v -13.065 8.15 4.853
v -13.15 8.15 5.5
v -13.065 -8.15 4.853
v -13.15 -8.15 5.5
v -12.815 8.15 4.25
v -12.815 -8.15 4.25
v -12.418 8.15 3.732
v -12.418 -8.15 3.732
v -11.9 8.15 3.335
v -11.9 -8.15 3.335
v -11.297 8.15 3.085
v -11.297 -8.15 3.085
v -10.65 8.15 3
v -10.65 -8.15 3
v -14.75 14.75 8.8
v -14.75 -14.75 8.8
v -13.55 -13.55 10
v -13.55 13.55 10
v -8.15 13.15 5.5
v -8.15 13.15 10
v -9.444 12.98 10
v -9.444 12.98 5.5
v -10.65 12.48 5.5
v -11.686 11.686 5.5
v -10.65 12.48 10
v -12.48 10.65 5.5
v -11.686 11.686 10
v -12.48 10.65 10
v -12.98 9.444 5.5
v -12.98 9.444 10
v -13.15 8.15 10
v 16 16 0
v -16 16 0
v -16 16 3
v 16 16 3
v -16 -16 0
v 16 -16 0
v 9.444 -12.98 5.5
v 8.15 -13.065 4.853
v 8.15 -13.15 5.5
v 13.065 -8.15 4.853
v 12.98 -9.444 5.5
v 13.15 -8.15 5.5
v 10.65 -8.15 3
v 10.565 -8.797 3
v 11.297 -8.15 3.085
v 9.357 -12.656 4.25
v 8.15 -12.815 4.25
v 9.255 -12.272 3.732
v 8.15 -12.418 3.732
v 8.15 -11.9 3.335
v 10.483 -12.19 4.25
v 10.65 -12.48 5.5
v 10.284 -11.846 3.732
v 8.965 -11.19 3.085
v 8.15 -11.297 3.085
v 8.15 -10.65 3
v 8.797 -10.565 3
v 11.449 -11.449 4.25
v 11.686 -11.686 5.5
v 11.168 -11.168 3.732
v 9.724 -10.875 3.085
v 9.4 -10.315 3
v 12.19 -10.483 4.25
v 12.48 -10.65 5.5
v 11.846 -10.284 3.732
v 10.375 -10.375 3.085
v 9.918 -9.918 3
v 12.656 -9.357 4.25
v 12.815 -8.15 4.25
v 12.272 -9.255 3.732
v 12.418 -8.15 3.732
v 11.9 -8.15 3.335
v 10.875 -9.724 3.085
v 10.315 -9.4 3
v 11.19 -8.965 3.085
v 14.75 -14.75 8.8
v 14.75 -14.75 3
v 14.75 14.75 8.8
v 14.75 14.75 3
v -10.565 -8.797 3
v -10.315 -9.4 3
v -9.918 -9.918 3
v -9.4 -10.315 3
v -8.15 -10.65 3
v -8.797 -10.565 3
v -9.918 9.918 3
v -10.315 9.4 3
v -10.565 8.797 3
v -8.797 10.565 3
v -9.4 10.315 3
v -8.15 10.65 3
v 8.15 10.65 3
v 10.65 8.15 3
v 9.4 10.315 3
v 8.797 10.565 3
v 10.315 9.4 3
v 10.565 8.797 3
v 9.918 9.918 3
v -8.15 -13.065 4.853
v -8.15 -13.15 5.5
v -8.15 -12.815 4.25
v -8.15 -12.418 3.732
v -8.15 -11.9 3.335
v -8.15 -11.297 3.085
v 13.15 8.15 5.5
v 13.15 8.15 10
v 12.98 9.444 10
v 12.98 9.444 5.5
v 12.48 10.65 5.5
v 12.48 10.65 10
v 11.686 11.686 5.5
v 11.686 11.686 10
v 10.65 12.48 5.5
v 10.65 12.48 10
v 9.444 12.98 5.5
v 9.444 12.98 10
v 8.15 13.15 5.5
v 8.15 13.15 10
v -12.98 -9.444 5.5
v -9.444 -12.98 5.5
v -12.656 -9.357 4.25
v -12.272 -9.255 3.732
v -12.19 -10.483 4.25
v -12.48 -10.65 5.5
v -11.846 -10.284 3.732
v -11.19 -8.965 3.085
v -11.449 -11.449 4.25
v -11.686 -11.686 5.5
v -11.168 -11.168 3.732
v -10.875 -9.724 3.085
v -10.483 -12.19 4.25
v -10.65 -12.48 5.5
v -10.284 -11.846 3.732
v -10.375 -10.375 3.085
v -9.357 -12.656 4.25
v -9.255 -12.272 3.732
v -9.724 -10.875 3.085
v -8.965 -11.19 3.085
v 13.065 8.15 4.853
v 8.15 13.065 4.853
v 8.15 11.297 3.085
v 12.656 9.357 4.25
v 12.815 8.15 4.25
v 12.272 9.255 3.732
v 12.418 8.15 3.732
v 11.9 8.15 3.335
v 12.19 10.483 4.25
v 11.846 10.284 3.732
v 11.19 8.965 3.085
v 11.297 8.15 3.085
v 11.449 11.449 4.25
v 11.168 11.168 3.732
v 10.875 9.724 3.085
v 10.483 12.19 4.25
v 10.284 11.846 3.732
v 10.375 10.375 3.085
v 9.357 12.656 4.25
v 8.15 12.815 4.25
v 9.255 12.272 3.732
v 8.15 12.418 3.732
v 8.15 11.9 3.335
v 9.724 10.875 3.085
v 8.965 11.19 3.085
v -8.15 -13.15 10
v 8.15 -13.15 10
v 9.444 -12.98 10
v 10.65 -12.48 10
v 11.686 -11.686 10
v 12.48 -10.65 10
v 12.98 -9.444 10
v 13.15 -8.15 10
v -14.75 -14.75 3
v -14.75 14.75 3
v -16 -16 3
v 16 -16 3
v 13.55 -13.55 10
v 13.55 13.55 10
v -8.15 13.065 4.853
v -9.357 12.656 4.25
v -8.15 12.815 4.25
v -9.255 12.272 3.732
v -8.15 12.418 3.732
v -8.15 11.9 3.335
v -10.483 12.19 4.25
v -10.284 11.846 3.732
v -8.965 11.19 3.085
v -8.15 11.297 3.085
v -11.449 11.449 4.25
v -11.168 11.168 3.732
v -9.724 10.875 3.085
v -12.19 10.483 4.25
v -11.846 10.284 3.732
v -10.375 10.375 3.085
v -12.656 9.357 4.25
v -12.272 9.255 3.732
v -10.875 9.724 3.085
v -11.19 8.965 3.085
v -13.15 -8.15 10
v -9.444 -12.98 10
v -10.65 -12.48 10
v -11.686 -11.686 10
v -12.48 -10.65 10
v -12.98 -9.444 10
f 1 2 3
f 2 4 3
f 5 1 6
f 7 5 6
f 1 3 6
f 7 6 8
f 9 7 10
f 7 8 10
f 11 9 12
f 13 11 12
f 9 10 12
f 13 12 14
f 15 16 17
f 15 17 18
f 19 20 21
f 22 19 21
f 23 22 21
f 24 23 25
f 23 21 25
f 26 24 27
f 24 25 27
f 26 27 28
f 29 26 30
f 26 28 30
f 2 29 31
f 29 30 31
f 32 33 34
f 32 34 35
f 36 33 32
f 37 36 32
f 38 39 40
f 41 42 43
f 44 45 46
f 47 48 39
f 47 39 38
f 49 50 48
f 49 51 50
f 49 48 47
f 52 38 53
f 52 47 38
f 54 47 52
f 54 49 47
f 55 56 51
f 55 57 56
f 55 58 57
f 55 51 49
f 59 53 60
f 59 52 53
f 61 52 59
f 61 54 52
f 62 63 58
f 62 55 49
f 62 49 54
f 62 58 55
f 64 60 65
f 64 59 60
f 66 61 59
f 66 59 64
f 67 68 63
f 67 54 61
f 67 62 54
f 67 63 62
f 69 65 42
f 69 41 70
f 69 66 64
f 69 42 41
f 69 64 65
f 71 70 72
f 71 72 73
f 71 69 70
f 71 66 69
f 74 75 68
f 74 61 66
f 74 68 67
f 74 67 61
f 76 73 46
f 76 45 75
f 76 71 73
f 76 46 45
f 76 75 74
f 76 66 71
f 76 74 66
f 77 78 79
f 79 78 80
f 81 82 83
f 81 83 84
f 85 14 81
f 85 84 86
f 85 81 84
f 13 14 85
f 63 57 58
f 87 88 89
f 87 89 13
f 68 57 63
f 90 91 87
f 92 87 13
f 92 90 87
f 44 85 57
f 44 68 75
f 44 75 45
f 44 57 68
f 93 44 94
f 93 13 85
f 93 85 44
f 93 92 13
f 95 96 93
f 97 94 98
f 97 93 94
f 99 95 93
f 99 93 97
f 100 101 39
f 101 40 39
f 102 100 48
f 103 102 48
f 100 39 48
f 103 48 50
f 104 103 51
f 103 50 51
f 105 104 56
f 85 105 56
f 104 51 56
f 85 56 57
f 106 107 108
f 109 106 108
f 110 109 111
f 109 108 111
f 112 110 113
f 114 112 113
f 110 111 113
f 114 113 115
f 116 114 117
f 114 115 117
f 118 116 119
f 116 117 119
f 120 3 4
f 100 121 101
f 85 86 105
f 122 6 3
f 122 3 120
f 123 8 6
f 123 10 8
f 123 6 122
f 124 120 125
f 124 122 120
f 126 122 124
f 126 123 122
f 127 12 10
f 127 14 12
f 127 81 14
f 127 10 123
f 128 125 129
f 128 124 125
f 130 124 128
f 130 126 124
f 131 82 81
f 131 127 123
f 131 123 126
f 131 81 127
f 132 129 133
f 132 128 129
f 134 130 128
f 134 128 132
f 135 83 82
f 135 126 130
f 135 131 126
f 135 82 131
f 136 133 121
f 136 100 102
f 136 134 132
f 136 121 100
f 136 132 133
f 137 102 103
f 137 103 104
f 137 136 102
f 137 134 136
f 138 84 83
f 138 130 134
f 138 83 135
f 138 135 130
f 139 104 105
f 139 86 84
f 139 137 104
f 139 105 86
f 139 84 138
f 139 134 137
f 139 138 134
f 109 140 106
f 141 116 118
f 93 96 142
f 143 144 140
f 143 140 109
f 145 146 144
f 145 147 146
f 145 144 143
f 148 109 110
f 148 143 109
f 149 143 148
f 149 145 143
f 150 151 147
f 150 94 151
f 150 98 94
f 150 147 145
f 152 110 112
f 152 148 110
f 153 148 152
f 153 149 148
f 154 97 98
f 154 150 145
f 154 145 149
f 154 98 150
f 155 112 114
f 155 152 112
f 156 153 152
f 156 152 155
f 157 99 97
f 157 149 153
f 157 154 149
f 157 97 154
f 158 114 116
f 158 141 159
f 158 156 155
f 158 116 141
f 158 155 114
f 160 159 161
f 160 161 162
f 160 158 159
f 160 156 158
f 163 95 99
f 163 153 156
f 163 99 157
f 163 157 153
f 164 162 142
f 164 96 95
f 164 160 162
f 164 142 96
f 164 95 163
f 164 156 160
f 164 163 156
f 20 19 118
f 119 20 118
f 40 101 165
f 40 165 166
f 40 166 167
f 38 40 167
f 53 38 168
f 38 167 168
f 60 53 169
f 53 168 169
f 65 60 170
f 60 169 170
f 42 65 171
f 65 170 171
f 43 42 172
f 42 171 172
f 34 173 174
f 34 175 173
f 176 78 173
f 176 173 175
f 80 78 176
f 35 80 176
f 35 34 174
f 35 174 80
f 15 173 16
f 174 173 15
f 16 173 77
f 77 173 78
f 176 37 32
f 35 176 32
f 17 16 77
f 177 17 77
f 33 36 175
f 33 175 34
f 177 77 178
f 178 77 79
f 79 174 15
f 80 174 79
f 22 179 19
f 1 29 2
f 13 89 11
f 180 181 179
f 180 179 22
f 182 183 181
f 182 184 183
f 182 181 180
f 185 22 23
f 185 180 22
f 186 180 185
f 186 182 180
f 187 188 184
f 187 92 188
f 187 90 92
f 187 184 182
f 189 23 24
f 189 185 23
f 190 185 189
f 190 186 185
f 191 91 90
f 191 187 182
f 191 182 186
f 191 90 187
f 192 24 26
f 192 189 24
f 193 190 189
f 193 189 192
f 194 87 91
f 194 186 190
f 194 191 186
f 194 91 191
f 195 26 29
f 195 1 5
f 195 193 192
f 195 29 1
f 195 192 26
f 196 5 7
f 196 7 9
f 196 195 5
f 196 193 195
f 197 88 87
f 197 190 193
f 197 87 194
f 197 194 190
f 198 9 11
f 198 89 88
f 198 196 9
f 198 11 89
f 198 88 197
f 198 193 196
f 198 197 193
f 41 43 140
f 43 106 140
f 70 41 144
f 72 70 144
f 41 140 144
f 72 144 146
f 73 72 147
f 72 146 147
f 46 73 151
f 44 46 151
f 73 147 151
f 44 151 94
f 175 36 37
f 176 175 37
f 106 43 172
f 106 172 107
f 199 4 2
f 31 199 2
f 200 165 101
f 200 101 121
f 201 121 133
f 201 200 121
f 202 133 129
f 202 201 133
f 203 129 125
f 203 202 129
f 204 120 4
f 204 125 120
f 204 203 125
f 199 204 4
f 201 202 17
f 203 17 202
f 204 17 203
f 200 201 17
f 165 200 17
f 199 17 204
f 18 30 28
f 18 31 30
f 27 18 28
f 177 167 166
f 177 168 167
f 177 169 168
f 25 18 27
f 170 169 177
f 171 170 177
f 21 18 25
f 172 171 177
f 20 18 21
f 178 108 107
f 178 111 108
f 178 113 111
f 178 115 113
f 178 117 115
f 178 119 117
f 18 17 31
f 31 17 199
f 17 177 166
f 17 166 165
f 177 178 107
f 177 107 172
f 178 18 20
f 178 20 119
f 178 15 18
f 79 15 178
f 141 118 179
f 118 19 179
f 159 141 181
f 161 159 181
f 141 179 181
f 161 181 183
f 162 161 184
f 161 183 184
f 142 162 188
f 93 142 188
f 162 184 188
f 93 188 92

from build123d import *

# Parameters (mm, degrees)
F0_W     = 32
F0_H     = 32
F0_W_2   = 29.5
F0_H_2   = 29.5
F0_W_3   = 26.3
F0_H_3   = 26.3
F1_DEPTH = 3
F2_DEPTH = 10
F3_R     = 5
F4_SIZE  = 1.2
F5_R     = 2.5


with BuildPart() as f1:
    # F0 (on Top) → F1 (new body)
    with BuildSketch(Plane.XY):
        Rectangle(F0_W, F0_H)
        Rectangle(F0_W_2, F0_H_2, mode=Mode.SUBTRACT)
        Rectangle(F0_W_2, F0_H_2)
        Rectangle(F0_W_3, F0_H_3, mode=Mode.SUBTRACT)
        Rectangle(F0_W_3, F0_H_3)
    extrude(amount=F1_DEPTH)

    # F0 (on Top) → F2 (join)
    with BuildSketch(Plane.XY):
        Rectangle(F0_W_2, F0_H_2)
        Rectangle(F0_W_3, F0_H_3, mode=Mode.SUBTRACT)
    extrude(amount=F2_DEPTH)

    # F3
    f3_edges = [f1.edges().sort_by_distance(p)[0] for p in [
        (-13.15, 13.15, 6.5),
        (13.15, 13.15, 6.5),
        (13.15, -13.15, 6.5),
        (-13.15, -13.15, 6.5),
    ]]
    fillet(f3_edges, radius=F3_R)

    # F4
    f4_edges = [f1.edges().sort_by_distance(p)[0] for p in [
        (-14.75, 0, 10),
        (0, -14.75, 10),
        (0, 14.75, 10),
        (14.75, 0, 10),
    ]]
    chamfer(f4_edges, length=F4_SIZE)

    # F5
    f5_edges = [f1.edges().sort_by_distance(p)[0] for p in [
        (11.685534, 11.685534, 3),
    ]]
    fillet(f5_edges, radius=F5_R)


solid = f1.part
